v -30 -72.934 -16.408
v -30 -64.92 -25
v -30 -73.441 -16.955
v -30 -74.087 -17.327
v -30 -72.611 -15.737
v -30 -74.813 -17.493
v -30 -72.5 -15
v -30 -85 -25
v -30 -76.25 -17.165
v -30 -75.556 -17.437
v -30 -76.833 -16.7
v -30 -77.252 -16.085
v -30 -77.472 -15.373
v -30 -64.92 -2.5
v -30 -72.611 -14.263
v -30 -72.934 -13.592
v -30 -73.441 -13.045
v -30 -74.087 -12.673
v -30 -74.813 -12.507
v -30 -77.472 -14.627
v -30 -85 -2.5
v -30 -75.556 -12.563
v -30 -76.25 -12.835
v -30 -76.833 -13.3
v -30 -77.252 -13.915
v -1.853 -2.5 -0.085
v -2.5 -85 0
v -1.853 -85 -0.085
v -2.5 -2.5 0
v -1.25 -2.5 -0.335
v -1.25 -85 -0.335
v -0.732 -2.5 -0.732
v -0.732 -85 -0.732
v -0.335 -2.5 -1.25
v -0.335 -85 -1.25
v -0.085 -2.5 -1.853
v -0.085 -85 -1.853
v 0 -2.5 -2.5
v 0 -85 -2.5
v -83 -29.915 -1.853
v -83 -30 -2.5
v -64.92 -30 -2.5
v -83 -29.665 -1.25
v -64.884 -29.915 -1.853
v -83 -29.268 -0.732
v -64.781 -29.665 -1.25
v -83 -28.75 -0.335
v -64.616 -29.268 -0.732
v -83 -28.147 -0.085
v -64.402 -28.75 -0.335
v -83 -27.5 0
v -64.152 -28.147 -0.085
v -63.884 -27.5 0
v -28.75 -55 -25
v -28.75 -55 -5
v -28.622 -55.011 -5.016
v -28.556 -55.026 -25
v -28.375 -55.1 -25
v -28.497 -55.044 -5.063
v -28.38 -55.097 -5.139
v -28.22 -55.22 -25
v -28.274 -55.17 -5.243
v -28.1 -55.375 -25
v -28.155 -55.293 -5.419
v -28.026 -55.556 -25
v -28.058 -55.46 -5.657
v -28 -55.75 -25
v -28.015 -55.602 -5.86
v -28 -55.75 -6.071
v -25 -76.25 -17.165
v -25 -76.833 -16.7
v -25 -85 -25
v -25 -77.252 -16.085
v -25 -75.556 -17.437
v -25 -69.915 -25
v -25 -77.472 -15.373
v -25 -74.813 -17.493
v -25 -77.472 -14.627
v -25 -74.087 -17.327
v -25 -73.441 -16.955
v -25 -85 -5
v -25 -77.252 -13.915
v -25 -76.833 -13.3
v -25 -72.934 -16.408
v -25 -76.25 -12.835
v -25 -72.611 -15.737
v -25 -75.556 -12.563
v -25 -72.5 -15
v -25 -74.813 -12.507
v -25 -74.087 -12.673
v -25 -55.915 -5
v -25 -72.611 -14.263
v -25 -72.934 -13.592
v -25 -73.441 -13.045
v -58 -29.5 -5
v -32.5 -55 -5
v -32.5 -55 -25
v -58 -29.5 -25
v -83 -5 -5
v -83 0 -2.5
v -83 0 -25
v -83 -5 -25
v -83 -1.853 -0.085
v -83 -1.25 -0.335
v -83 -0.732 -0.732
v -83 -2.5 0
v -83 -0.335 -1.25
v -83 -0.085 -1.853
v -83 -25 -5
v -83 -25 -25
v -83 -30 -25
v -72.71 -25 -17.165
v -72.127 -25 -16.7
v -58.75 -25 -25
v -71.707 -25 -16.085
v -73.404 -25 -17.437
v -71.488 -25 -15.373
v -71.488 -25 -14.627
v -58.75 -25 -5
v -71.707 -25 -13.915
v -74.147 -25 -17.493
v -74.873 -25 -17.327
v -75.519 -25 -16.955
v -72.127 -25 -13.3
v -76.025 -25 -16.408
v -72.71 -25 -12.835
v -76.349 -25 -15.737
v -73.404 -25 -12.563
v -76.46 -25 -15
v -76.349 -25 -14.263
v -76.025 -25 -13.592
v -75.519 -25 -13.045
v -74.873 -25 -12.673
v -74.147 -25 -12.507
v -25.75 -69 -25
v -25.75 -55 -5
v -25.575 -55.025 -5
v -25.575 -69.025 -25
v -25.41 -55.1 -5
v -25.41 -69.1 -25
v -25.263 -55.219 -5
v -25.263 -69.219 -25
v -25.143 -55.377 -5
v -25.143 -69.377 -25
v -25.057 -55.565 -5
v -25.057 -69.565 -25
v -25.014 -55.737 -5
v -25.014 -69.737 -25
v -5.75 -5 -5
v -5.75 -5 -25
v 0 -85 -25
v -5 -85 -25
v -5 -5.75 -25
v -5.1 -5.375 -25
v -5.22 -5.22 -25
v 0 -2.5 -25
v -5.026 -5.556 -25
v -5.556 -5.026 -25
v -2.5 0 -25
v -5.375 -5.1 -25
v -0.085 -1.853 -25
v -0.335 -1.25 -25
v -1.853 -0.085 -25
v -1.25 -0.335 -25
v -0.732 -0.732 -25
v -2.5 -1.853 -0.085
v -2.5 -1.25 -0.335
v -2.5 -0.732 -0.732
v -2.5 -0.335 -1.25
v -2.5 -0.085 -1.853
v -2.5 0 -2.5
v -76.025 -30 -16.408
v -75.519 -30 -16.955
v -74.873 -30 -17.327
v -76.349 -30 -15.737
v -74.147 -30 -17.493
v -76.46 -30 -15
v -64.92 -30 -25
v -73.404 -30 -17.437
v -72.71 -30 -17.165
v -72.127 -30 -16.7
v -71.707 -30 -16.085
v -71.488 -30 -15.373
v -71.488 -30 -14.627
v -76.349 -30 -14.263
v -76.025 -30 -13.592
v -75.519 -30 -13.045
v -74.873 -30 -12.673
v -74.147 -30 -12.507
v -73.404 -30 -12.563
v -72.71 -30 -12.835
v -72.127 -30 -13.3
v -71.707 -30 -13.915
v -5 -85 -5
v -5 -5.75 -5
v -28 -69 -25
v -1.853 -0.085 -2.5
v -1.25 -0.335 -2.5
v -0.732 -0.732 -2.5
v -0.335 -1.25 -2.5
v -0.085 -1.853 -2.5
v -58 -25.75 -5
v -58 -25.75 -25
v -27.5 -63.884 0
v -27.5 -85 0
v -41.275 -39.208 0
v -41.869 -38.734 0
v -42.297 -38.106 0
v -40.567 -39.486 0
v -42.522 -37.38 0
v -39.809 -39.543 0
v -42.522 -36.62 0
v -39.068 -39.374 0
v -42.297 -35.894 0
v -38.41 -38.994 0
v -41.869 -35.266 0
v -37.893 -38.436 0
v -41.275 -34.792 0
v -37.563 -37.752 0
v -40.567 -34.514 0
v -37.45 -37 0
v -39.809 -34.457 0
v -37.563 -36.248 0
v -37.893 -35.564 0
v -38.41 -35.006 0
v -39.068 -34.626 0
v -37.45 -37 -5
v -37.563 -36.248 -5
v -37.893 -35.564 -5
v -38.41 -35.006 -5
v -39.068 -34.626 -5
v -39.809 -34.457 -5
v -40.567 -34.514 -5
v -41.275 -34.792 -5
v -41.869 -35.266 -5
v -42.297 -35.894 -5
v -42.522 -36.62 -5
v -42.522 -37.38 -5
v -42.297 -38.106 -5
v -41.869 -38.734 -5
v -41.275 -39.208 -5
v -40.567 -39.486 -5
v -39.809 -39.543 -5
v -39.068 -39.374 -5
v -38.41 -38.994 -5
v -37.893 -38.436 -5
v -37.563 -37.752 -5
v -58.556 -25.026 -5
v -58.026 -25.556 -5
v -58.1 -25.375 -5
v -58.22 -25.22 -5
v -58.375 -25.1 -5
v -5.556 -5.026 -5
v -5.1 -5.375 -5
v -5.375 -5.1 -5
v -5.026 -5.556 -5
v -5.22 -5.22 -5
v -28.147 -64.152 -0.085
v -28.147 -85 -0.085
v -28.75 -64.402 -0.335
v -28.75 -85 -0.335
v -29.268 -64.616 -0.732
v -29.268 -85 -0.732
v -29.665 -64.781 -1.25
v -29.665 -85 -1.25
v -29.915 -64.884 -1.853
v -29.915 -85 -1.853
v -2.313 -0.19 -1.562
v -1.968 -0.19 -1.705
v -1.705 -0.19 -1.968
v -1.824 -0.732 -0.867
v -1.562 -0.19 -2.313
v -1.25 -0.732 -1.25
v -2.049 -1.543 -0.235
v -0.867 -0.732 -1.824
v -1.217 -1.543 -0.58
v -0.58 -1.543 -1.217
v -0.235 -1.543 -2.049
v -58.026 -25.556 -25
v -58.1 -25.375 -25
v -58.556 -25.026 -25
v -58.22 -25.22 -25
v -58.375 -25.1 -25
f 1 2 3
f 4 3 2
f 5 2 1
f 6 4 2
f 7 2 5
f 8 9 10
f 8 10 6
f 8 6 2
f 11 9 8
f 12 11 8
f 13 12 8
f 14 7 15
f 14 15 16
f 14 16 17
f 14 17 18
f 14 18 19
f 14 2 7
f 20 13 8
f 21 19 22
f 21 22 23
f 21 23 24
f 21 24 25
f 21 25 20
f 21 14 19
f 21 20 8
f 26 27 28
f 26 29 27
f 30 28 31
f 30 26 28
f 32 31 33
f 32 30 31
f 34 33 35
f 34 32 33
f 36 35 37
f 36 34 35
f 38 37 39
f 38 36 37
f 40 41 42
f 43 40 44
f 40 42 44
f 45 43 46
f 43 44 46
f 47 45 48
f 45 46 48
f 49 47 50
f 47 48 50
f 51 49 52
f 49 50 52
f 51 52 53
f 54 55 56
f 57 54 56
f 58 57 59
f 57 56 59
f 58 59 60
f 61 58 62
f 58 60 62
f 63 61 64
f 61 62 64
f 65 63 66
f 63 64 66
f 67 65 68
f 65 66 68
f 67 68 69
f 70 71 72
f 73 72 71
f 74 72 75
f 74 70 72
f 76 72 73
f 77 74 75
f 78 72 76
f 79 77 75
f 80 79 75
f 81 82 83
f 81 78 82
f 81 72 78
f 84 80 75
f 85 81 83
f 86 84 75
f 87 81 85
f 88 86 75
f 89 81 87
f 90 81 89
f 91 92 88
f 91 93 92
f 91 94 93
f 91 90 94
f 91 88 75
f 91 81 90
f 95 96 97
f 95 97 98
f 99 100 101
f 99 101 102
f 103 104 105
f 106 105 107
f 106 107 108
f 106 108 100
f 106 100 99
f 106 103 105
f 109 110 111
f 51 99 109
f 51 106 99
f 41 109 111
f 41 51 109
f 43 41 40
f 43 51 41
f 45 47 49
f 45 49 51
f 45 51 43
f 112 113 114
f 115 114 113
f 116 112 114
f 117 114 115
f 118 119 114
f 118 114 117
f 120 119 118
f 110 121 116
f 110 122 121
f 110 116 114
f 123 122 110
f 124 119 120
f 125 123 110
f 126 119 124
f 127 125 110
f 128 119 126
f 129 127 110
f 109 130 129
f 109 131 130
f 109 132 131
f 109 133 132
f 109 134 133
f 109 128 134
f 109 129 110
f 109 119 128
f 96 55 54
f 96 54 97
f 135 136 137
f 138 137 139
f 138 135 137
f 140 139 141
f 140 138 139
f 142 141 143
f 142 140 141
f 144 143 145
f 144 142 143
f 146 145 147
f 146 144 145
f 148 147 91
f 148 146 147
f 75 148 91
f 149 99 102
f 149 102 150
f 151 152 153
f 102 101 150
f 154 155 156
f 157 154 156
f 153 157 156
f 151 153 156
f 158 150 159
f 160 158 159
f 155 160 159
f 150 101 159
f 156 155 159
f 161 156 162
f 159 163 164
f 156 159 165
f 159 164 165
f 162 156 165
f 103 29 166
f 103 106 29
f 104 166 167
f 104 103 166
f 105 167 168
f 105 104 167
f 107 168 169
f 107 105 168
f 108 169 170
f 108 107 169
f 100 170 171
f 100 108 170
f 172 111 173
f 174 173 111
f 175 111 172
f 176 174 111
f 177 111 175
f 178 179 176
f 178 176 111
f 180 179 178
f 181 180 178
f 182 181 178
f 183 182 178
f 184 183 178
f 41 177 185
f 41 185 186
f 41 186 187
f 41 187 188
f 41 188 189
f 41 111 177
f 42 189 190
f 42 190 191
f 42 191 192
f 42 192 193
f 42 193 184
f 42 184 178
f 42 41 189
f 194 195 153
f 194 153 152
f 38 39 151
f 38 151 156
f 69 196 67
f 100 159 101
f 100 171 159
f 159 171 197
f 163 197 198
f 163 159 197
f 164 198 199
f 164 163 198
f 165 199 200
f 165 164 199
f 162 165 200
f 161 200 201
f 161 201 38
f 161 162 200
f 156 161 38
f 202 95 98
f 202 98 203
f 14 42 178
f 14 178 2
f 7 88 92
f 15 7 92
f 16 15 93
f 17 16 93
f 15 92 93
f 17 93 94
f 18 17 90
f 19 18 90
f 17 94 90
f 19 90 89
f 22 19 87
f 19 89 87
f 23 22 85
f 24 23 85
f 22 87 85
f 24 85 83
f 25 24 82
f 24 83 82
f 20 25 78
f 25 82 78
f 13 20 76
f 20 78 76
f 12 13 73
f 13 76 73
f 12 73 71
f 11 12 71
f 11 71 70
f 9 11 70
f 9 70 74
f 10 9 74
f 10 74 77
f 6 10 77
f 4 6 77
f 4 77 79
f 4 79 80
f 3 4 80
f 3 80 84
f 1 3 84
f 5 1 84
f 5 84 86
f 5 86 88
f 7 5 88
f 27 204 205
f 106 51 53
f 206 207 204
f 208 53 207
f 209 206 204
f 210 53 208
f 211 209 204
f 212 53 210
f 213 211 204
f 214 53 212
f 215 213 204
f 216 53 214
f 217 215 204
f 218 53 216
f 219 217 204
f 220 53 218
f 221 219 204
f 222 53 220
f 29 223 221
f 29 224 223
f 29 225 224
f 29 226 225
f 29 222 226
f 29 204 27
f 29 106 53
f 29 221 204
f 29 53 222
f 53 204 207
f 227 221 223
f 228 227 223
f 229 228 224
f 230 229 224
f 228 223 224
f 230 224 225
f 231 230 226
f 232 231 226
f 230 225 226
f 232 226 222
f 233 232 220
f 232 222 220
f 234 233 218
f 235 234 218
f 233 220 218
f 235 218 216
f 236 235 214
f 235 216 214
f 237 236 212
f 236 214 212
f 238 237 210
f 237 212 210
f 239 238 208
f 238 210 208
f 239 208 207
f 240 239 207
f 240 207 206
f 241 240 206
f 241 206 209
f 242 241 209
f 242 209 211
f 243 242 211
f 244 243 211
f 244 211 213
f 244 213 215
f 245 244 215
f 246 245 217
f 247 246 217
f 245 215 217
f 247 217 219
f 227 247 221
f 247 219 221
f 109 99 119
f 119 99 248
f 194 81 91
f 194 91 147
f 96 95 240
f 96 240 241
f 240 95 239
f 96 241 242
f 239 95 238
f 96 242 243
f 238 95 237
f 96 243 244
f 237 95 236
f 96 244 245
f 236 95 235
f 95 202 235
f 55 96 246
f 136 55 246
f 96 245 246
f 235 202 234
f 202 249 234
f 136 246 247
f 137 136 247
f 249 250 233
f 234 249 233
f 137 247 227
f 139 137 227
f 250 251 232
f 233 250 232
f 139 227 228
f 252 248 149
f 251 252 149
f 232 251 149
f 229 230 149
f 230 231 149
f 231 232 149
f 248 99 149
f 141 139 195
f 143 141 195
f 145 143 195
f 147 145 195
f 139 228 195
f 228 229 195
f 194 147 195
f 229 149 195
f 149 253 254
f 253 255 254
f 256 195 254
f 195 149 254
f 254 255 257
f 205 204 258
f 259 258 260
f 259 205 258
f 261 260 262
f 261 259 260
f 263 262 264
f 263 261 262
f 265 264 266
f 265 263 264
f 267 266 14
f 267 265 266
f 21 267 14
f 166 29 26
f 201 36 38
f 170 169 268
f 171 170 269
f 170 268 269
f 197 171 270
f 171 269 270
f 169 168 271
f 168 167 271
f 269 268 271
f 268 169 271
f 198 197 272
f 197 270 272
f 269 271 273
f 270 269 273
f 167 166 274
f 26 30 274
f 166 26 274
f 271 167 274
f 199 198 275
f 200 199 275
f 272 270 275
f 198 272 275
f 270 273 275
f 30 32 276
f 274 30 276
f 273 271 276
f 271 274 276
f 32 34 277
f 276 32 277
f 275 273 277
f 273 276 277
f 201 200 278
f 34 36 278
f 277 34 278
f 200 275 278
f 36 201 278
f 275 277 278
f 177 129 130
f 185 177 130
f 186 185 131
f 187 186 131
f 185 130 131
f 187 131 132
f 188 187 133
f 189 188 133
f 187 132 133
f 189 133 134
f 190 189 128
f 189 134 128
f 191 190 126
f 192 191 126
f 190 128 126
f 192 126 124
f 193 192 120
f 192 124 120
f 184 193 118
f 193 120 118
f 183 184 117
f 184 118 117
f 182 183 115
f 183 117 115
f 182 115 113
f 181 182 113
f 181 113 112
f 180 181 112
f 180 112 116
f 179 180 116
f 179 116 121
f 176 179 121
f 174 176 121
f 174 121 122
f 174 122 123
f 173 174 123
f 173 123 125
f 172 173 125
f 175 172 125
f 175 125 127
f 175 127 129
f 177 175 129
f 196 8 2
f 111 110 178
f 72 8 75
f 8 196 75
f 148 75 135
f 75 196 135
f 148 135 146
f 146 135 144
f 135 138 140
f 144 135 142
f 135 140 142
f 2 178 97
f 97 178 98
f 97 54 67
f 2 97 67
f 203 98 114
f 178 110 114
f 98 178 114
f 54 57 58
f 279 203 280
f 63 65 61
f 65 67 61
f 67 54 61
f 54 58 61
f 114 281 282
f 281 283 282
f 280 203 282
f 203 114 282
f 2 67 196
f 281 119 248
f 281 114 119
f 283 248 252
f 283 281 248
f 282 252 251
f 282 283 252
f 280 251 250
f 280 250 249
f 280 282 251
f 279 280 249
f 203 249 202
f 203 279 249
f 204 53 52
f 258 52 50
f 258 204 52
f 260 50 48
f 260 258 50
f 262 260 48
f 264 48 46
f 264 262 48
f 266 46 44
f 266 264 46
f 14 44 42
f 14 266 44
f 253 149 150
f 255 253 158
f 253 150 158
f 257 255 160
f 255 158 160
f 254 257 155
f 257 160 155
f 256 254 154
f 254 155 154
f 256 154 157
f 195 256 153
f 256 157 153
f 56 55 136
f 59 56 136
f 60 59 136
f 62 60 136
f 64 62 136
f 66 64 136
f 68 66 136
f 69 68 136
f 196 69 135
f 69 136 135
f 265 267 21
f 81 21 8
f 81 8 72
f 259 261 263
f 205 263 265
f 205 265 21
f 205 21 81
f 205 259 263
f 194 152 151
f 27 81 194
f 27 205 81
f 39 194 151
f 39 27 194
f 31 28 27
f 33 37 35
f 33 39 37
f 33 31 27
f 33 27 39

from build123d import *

# Parameters (mm, degrees)
F0_R      = 2.55
F1_DEPTH  = 5
F2_DEPTH  = 25
F3_R      = 2.5
F5_DEPTH  = 3
F6_R      = 0.75
F8_D      = 5
F8_DEPTH  = 6
F10_D     = 5
F10_DEPTH = 6


with BuildPart() as f1:
    # F0 (on Top) → F1 (new body)
    with BuildSketch(Plane.XY):
        Polygon((-58, -25), (-83, -25), (-83, -30), (-64.919747, -30), (-30, -64.919747), (-30, -85), (-25, -85), (-25, -55), (-32.5, -55), (-58, -29.5), align=None)
        Polygon((0, 0), (-83, 0), (-83, -5), (-5, -5), (-5, -85), (0, -85), align=None)
        Polygon((-5, -5), (-83, -5), (-83, -25), (-58, -25), (-58, -29.5), (-32.5, -55), (-25, -55), (-25, -85), (-5, -85), align=None)
        with Locations((-40, -37)):
            Circle(F0_R, mode=Mode.SUBTRACT)
    extrude(amount=-F1_DEPTH)

    # F0 (on Top) → F2 (join)
    with BuildSketch(Plane.XY):
        Polygon((-58, -25), (-83, -25), (-83, -30), (-64.919747, -30), (-30, -64.919747), (-30, -85), (-25, -85), (-25, -55), (-32.5, -55), (-58, -29.5), align=None)
        Polygon((0, 0), (-83, 0), (-83, -5), (-5, -5), (-5, -85), (0, -85), align=None)
    extrude(amount=-F2_DEPTH)

    # F3
    f3_edges = [f1.edges().sort_by_distance(p)[0] for p in [
        (-73.959874, -30, 0),
        (-47.459874, -47.459874, 0),
        (-30, -74.959874, 0),
        (0, -42.5, 0),
        (-41.5, 0, 0),
        (0, 0, -12.5),
    ]]
    fillet(f3_edges, radius=F3_R)

    # F4 (on face) → F5 (cut)
    with BuildSketch(Plane.YZ.offset(-25)):
        Polygon((-55, -25), (-55, -5), (-69, -25), align=None)
    extrude(amount=-F5_DEPTH, mode=Mode.SUBTRACT)

    # F6
    f6_edges = [f1.edges().sort_by_distance(p)[0] for p in [
        (-58, -25, -15),
        (-28, -55, -15),
        (-25, -62, -15),
        (-5, -5, -15),
    ]]
    fillet(f6_edges, radius=F6_R)

    # F8
    with Locations(Plane(origin=(-30, 0, 0), x_dir=(0, -1, 0), z_dir=(-1, 0, 0))):
        with Locations((75, -15)):
            Hole(F8_D / 2, depth=F8_DEPTH)

    # F10
    with Locations(Plane.XZ.offset(30)):
        with Locations((-73.959874, -15)):
            Hole(F10_D / 2, depth=F10_DEPTH)


solid = f1.part
